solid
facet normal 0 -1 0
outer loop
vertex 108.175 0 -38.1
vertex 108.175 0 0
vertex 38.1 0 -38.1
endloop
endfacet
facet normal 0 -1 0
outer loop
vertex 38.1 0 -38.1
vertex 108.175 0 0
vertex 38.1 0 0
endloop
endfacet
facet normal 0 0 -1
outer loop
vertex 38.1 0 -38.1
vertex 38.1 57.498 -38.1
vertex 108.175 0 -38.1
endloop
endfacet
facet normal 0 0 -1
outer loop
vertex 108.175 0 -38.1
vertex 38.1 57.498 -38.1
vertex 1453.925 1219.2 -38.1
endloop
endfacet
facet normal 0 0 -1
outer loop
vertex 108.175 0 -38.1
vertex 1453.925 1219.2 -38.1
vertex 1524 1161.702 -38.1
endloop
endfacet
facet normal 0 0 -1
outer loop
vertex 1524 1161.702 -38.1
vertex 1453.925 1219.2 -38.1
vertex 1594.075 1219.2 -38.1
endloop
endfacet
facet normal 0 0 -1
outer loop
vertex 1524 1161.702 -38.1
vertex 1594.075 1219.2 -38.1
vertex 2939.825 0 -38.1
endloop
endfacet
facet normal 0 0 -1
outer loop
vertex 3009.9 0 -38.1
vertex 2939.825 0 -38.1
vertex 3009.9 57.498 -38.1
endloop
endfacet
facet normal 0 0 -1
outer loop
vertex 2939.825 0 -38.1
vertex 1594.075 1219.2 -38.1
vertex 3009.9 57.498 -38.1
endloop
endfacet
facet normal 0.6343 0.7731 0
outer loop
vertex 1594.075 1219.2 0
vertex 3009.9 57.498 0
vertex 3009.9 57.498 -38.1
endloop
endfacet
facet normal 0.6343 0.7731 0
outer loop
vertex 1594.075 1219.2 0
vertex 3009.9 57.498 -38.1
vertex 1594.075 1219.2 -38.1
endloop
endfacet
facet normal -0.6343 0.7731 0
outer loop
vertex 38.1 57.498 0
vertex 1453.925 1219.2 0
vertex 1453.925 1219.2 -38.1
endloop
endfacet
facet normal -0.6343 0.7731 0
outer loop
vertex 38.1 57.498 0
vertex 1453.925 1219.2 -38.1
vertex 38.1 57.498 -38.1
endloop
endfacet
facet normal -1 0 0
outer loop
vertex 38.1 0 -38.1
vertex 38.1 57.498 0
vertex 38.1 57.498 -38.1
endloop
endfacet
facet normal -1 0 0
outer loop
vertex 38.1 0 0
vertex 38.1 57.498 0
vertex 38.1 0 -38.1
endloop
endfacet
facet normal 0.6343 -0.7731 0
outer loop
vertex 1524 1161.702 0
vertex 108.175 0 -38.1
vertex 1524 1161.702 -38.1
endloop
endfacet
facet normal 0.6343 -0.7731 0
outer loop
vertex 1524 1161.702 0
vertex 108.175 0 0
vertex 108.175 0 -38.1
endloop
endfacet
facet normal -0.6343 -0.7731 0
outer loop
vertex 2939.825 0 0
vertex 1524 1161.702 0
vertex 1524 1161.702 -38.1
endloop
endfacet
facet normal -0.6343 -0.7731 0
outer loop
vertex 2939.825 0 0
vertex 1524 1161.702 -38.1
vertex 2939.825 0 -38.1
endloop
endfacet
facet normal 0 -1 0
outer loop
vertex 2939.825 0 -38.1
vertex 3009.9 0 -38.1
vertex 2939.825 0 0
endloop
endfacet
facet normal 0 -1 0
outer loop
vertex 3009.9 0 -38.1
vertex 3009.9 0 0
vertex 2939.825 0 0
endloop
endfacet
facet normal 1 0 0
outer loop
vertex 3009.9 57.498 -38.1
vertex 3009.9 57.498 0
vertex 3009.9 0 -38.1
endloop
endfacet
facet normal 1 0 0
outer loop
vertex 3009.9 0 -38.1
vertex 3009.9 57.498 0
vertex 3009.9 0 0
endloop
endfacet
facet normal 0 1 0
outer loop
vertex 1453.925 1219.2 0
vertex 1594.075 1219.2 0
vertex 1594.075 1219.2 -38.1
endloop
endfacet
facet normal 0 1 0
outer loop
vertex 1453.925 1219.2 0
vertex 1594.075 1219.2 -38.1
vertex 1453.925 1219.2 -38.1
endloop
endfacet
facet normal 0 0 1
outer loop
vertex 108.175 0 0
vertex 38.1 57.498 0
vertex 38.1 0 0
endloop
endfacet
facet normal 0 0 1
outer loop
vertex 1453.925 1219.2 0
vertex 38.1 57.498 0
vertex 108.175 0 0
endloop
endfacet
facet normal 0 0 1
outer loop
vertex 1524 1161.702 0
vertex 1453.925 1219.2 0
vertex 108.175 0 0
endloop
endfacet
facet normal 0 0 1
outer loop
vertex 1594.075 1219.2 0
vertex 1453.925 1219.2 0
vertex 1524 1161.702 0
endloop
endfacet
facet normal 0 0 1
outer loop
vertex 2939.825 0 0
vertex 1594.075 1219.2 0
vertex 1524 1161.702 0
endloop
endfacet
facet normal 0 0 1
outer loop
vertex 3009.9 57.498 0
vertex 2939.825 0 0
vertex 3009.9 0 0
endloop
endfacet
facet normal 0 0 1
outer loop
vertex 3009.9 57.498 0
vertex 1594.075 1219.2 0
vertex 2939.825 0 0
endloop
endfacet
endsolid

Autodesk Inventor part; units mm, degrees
ref_plane "YZ Plane" through (0, 0, 0) normal (1, 0, 0) x (0, 1, 0)
ref_plane "XZ Plane" through (0, 0, 0) normal (0, 1, 0) x (-1, 0, 0)
ref_plane "XY Plane" through (0, 0, 0) normal (0, 0, 1) x (1, 0, 0)
sketch "Sketch1" plane through (0, 0, 0) normal (0, 0, 1) x (1, 0, 0)
  line L0 (3048, 0) -> (0, 0) projected
  line L1 (38.1, 1219.2) -> (38.1, 0) projected
  line L2 (3048, 1219.2) -> (0, 1219.2) projected
  line L3 (3009.9, 1219.2) -> (3009.9, 0) projected
  line L4 (3009.9, 57.4978) -> (1594.0754, 1219.2)
  line L5 (1453.9246, 1219.2) -> (38.1, 57.4978)
  line L6 (108.1754, 0) -> (1524, 1161.7022)
  line L7 (1524, 1161.7022) -> (2939.8246, 0)
  line L8 (3009.9, 57.4978) -> (3009.9, 0)
  line L9 (2939.8246, 0) -> (3009.9, 0)
  line L10 (1594.0754, 1219.2) -> (1453.9246, 1219.2)
  line L11 (38.1, 57.4978) -> (38.1, 0)
  line L12 (38.1, 0) -> (108.1754, 0)
extrude "Extrusion1" add sketch "Sketch1" against normal blind 38.1 contours L0 L7 L6 L1 L5 L2 L4 L3
properties part number "side1"
